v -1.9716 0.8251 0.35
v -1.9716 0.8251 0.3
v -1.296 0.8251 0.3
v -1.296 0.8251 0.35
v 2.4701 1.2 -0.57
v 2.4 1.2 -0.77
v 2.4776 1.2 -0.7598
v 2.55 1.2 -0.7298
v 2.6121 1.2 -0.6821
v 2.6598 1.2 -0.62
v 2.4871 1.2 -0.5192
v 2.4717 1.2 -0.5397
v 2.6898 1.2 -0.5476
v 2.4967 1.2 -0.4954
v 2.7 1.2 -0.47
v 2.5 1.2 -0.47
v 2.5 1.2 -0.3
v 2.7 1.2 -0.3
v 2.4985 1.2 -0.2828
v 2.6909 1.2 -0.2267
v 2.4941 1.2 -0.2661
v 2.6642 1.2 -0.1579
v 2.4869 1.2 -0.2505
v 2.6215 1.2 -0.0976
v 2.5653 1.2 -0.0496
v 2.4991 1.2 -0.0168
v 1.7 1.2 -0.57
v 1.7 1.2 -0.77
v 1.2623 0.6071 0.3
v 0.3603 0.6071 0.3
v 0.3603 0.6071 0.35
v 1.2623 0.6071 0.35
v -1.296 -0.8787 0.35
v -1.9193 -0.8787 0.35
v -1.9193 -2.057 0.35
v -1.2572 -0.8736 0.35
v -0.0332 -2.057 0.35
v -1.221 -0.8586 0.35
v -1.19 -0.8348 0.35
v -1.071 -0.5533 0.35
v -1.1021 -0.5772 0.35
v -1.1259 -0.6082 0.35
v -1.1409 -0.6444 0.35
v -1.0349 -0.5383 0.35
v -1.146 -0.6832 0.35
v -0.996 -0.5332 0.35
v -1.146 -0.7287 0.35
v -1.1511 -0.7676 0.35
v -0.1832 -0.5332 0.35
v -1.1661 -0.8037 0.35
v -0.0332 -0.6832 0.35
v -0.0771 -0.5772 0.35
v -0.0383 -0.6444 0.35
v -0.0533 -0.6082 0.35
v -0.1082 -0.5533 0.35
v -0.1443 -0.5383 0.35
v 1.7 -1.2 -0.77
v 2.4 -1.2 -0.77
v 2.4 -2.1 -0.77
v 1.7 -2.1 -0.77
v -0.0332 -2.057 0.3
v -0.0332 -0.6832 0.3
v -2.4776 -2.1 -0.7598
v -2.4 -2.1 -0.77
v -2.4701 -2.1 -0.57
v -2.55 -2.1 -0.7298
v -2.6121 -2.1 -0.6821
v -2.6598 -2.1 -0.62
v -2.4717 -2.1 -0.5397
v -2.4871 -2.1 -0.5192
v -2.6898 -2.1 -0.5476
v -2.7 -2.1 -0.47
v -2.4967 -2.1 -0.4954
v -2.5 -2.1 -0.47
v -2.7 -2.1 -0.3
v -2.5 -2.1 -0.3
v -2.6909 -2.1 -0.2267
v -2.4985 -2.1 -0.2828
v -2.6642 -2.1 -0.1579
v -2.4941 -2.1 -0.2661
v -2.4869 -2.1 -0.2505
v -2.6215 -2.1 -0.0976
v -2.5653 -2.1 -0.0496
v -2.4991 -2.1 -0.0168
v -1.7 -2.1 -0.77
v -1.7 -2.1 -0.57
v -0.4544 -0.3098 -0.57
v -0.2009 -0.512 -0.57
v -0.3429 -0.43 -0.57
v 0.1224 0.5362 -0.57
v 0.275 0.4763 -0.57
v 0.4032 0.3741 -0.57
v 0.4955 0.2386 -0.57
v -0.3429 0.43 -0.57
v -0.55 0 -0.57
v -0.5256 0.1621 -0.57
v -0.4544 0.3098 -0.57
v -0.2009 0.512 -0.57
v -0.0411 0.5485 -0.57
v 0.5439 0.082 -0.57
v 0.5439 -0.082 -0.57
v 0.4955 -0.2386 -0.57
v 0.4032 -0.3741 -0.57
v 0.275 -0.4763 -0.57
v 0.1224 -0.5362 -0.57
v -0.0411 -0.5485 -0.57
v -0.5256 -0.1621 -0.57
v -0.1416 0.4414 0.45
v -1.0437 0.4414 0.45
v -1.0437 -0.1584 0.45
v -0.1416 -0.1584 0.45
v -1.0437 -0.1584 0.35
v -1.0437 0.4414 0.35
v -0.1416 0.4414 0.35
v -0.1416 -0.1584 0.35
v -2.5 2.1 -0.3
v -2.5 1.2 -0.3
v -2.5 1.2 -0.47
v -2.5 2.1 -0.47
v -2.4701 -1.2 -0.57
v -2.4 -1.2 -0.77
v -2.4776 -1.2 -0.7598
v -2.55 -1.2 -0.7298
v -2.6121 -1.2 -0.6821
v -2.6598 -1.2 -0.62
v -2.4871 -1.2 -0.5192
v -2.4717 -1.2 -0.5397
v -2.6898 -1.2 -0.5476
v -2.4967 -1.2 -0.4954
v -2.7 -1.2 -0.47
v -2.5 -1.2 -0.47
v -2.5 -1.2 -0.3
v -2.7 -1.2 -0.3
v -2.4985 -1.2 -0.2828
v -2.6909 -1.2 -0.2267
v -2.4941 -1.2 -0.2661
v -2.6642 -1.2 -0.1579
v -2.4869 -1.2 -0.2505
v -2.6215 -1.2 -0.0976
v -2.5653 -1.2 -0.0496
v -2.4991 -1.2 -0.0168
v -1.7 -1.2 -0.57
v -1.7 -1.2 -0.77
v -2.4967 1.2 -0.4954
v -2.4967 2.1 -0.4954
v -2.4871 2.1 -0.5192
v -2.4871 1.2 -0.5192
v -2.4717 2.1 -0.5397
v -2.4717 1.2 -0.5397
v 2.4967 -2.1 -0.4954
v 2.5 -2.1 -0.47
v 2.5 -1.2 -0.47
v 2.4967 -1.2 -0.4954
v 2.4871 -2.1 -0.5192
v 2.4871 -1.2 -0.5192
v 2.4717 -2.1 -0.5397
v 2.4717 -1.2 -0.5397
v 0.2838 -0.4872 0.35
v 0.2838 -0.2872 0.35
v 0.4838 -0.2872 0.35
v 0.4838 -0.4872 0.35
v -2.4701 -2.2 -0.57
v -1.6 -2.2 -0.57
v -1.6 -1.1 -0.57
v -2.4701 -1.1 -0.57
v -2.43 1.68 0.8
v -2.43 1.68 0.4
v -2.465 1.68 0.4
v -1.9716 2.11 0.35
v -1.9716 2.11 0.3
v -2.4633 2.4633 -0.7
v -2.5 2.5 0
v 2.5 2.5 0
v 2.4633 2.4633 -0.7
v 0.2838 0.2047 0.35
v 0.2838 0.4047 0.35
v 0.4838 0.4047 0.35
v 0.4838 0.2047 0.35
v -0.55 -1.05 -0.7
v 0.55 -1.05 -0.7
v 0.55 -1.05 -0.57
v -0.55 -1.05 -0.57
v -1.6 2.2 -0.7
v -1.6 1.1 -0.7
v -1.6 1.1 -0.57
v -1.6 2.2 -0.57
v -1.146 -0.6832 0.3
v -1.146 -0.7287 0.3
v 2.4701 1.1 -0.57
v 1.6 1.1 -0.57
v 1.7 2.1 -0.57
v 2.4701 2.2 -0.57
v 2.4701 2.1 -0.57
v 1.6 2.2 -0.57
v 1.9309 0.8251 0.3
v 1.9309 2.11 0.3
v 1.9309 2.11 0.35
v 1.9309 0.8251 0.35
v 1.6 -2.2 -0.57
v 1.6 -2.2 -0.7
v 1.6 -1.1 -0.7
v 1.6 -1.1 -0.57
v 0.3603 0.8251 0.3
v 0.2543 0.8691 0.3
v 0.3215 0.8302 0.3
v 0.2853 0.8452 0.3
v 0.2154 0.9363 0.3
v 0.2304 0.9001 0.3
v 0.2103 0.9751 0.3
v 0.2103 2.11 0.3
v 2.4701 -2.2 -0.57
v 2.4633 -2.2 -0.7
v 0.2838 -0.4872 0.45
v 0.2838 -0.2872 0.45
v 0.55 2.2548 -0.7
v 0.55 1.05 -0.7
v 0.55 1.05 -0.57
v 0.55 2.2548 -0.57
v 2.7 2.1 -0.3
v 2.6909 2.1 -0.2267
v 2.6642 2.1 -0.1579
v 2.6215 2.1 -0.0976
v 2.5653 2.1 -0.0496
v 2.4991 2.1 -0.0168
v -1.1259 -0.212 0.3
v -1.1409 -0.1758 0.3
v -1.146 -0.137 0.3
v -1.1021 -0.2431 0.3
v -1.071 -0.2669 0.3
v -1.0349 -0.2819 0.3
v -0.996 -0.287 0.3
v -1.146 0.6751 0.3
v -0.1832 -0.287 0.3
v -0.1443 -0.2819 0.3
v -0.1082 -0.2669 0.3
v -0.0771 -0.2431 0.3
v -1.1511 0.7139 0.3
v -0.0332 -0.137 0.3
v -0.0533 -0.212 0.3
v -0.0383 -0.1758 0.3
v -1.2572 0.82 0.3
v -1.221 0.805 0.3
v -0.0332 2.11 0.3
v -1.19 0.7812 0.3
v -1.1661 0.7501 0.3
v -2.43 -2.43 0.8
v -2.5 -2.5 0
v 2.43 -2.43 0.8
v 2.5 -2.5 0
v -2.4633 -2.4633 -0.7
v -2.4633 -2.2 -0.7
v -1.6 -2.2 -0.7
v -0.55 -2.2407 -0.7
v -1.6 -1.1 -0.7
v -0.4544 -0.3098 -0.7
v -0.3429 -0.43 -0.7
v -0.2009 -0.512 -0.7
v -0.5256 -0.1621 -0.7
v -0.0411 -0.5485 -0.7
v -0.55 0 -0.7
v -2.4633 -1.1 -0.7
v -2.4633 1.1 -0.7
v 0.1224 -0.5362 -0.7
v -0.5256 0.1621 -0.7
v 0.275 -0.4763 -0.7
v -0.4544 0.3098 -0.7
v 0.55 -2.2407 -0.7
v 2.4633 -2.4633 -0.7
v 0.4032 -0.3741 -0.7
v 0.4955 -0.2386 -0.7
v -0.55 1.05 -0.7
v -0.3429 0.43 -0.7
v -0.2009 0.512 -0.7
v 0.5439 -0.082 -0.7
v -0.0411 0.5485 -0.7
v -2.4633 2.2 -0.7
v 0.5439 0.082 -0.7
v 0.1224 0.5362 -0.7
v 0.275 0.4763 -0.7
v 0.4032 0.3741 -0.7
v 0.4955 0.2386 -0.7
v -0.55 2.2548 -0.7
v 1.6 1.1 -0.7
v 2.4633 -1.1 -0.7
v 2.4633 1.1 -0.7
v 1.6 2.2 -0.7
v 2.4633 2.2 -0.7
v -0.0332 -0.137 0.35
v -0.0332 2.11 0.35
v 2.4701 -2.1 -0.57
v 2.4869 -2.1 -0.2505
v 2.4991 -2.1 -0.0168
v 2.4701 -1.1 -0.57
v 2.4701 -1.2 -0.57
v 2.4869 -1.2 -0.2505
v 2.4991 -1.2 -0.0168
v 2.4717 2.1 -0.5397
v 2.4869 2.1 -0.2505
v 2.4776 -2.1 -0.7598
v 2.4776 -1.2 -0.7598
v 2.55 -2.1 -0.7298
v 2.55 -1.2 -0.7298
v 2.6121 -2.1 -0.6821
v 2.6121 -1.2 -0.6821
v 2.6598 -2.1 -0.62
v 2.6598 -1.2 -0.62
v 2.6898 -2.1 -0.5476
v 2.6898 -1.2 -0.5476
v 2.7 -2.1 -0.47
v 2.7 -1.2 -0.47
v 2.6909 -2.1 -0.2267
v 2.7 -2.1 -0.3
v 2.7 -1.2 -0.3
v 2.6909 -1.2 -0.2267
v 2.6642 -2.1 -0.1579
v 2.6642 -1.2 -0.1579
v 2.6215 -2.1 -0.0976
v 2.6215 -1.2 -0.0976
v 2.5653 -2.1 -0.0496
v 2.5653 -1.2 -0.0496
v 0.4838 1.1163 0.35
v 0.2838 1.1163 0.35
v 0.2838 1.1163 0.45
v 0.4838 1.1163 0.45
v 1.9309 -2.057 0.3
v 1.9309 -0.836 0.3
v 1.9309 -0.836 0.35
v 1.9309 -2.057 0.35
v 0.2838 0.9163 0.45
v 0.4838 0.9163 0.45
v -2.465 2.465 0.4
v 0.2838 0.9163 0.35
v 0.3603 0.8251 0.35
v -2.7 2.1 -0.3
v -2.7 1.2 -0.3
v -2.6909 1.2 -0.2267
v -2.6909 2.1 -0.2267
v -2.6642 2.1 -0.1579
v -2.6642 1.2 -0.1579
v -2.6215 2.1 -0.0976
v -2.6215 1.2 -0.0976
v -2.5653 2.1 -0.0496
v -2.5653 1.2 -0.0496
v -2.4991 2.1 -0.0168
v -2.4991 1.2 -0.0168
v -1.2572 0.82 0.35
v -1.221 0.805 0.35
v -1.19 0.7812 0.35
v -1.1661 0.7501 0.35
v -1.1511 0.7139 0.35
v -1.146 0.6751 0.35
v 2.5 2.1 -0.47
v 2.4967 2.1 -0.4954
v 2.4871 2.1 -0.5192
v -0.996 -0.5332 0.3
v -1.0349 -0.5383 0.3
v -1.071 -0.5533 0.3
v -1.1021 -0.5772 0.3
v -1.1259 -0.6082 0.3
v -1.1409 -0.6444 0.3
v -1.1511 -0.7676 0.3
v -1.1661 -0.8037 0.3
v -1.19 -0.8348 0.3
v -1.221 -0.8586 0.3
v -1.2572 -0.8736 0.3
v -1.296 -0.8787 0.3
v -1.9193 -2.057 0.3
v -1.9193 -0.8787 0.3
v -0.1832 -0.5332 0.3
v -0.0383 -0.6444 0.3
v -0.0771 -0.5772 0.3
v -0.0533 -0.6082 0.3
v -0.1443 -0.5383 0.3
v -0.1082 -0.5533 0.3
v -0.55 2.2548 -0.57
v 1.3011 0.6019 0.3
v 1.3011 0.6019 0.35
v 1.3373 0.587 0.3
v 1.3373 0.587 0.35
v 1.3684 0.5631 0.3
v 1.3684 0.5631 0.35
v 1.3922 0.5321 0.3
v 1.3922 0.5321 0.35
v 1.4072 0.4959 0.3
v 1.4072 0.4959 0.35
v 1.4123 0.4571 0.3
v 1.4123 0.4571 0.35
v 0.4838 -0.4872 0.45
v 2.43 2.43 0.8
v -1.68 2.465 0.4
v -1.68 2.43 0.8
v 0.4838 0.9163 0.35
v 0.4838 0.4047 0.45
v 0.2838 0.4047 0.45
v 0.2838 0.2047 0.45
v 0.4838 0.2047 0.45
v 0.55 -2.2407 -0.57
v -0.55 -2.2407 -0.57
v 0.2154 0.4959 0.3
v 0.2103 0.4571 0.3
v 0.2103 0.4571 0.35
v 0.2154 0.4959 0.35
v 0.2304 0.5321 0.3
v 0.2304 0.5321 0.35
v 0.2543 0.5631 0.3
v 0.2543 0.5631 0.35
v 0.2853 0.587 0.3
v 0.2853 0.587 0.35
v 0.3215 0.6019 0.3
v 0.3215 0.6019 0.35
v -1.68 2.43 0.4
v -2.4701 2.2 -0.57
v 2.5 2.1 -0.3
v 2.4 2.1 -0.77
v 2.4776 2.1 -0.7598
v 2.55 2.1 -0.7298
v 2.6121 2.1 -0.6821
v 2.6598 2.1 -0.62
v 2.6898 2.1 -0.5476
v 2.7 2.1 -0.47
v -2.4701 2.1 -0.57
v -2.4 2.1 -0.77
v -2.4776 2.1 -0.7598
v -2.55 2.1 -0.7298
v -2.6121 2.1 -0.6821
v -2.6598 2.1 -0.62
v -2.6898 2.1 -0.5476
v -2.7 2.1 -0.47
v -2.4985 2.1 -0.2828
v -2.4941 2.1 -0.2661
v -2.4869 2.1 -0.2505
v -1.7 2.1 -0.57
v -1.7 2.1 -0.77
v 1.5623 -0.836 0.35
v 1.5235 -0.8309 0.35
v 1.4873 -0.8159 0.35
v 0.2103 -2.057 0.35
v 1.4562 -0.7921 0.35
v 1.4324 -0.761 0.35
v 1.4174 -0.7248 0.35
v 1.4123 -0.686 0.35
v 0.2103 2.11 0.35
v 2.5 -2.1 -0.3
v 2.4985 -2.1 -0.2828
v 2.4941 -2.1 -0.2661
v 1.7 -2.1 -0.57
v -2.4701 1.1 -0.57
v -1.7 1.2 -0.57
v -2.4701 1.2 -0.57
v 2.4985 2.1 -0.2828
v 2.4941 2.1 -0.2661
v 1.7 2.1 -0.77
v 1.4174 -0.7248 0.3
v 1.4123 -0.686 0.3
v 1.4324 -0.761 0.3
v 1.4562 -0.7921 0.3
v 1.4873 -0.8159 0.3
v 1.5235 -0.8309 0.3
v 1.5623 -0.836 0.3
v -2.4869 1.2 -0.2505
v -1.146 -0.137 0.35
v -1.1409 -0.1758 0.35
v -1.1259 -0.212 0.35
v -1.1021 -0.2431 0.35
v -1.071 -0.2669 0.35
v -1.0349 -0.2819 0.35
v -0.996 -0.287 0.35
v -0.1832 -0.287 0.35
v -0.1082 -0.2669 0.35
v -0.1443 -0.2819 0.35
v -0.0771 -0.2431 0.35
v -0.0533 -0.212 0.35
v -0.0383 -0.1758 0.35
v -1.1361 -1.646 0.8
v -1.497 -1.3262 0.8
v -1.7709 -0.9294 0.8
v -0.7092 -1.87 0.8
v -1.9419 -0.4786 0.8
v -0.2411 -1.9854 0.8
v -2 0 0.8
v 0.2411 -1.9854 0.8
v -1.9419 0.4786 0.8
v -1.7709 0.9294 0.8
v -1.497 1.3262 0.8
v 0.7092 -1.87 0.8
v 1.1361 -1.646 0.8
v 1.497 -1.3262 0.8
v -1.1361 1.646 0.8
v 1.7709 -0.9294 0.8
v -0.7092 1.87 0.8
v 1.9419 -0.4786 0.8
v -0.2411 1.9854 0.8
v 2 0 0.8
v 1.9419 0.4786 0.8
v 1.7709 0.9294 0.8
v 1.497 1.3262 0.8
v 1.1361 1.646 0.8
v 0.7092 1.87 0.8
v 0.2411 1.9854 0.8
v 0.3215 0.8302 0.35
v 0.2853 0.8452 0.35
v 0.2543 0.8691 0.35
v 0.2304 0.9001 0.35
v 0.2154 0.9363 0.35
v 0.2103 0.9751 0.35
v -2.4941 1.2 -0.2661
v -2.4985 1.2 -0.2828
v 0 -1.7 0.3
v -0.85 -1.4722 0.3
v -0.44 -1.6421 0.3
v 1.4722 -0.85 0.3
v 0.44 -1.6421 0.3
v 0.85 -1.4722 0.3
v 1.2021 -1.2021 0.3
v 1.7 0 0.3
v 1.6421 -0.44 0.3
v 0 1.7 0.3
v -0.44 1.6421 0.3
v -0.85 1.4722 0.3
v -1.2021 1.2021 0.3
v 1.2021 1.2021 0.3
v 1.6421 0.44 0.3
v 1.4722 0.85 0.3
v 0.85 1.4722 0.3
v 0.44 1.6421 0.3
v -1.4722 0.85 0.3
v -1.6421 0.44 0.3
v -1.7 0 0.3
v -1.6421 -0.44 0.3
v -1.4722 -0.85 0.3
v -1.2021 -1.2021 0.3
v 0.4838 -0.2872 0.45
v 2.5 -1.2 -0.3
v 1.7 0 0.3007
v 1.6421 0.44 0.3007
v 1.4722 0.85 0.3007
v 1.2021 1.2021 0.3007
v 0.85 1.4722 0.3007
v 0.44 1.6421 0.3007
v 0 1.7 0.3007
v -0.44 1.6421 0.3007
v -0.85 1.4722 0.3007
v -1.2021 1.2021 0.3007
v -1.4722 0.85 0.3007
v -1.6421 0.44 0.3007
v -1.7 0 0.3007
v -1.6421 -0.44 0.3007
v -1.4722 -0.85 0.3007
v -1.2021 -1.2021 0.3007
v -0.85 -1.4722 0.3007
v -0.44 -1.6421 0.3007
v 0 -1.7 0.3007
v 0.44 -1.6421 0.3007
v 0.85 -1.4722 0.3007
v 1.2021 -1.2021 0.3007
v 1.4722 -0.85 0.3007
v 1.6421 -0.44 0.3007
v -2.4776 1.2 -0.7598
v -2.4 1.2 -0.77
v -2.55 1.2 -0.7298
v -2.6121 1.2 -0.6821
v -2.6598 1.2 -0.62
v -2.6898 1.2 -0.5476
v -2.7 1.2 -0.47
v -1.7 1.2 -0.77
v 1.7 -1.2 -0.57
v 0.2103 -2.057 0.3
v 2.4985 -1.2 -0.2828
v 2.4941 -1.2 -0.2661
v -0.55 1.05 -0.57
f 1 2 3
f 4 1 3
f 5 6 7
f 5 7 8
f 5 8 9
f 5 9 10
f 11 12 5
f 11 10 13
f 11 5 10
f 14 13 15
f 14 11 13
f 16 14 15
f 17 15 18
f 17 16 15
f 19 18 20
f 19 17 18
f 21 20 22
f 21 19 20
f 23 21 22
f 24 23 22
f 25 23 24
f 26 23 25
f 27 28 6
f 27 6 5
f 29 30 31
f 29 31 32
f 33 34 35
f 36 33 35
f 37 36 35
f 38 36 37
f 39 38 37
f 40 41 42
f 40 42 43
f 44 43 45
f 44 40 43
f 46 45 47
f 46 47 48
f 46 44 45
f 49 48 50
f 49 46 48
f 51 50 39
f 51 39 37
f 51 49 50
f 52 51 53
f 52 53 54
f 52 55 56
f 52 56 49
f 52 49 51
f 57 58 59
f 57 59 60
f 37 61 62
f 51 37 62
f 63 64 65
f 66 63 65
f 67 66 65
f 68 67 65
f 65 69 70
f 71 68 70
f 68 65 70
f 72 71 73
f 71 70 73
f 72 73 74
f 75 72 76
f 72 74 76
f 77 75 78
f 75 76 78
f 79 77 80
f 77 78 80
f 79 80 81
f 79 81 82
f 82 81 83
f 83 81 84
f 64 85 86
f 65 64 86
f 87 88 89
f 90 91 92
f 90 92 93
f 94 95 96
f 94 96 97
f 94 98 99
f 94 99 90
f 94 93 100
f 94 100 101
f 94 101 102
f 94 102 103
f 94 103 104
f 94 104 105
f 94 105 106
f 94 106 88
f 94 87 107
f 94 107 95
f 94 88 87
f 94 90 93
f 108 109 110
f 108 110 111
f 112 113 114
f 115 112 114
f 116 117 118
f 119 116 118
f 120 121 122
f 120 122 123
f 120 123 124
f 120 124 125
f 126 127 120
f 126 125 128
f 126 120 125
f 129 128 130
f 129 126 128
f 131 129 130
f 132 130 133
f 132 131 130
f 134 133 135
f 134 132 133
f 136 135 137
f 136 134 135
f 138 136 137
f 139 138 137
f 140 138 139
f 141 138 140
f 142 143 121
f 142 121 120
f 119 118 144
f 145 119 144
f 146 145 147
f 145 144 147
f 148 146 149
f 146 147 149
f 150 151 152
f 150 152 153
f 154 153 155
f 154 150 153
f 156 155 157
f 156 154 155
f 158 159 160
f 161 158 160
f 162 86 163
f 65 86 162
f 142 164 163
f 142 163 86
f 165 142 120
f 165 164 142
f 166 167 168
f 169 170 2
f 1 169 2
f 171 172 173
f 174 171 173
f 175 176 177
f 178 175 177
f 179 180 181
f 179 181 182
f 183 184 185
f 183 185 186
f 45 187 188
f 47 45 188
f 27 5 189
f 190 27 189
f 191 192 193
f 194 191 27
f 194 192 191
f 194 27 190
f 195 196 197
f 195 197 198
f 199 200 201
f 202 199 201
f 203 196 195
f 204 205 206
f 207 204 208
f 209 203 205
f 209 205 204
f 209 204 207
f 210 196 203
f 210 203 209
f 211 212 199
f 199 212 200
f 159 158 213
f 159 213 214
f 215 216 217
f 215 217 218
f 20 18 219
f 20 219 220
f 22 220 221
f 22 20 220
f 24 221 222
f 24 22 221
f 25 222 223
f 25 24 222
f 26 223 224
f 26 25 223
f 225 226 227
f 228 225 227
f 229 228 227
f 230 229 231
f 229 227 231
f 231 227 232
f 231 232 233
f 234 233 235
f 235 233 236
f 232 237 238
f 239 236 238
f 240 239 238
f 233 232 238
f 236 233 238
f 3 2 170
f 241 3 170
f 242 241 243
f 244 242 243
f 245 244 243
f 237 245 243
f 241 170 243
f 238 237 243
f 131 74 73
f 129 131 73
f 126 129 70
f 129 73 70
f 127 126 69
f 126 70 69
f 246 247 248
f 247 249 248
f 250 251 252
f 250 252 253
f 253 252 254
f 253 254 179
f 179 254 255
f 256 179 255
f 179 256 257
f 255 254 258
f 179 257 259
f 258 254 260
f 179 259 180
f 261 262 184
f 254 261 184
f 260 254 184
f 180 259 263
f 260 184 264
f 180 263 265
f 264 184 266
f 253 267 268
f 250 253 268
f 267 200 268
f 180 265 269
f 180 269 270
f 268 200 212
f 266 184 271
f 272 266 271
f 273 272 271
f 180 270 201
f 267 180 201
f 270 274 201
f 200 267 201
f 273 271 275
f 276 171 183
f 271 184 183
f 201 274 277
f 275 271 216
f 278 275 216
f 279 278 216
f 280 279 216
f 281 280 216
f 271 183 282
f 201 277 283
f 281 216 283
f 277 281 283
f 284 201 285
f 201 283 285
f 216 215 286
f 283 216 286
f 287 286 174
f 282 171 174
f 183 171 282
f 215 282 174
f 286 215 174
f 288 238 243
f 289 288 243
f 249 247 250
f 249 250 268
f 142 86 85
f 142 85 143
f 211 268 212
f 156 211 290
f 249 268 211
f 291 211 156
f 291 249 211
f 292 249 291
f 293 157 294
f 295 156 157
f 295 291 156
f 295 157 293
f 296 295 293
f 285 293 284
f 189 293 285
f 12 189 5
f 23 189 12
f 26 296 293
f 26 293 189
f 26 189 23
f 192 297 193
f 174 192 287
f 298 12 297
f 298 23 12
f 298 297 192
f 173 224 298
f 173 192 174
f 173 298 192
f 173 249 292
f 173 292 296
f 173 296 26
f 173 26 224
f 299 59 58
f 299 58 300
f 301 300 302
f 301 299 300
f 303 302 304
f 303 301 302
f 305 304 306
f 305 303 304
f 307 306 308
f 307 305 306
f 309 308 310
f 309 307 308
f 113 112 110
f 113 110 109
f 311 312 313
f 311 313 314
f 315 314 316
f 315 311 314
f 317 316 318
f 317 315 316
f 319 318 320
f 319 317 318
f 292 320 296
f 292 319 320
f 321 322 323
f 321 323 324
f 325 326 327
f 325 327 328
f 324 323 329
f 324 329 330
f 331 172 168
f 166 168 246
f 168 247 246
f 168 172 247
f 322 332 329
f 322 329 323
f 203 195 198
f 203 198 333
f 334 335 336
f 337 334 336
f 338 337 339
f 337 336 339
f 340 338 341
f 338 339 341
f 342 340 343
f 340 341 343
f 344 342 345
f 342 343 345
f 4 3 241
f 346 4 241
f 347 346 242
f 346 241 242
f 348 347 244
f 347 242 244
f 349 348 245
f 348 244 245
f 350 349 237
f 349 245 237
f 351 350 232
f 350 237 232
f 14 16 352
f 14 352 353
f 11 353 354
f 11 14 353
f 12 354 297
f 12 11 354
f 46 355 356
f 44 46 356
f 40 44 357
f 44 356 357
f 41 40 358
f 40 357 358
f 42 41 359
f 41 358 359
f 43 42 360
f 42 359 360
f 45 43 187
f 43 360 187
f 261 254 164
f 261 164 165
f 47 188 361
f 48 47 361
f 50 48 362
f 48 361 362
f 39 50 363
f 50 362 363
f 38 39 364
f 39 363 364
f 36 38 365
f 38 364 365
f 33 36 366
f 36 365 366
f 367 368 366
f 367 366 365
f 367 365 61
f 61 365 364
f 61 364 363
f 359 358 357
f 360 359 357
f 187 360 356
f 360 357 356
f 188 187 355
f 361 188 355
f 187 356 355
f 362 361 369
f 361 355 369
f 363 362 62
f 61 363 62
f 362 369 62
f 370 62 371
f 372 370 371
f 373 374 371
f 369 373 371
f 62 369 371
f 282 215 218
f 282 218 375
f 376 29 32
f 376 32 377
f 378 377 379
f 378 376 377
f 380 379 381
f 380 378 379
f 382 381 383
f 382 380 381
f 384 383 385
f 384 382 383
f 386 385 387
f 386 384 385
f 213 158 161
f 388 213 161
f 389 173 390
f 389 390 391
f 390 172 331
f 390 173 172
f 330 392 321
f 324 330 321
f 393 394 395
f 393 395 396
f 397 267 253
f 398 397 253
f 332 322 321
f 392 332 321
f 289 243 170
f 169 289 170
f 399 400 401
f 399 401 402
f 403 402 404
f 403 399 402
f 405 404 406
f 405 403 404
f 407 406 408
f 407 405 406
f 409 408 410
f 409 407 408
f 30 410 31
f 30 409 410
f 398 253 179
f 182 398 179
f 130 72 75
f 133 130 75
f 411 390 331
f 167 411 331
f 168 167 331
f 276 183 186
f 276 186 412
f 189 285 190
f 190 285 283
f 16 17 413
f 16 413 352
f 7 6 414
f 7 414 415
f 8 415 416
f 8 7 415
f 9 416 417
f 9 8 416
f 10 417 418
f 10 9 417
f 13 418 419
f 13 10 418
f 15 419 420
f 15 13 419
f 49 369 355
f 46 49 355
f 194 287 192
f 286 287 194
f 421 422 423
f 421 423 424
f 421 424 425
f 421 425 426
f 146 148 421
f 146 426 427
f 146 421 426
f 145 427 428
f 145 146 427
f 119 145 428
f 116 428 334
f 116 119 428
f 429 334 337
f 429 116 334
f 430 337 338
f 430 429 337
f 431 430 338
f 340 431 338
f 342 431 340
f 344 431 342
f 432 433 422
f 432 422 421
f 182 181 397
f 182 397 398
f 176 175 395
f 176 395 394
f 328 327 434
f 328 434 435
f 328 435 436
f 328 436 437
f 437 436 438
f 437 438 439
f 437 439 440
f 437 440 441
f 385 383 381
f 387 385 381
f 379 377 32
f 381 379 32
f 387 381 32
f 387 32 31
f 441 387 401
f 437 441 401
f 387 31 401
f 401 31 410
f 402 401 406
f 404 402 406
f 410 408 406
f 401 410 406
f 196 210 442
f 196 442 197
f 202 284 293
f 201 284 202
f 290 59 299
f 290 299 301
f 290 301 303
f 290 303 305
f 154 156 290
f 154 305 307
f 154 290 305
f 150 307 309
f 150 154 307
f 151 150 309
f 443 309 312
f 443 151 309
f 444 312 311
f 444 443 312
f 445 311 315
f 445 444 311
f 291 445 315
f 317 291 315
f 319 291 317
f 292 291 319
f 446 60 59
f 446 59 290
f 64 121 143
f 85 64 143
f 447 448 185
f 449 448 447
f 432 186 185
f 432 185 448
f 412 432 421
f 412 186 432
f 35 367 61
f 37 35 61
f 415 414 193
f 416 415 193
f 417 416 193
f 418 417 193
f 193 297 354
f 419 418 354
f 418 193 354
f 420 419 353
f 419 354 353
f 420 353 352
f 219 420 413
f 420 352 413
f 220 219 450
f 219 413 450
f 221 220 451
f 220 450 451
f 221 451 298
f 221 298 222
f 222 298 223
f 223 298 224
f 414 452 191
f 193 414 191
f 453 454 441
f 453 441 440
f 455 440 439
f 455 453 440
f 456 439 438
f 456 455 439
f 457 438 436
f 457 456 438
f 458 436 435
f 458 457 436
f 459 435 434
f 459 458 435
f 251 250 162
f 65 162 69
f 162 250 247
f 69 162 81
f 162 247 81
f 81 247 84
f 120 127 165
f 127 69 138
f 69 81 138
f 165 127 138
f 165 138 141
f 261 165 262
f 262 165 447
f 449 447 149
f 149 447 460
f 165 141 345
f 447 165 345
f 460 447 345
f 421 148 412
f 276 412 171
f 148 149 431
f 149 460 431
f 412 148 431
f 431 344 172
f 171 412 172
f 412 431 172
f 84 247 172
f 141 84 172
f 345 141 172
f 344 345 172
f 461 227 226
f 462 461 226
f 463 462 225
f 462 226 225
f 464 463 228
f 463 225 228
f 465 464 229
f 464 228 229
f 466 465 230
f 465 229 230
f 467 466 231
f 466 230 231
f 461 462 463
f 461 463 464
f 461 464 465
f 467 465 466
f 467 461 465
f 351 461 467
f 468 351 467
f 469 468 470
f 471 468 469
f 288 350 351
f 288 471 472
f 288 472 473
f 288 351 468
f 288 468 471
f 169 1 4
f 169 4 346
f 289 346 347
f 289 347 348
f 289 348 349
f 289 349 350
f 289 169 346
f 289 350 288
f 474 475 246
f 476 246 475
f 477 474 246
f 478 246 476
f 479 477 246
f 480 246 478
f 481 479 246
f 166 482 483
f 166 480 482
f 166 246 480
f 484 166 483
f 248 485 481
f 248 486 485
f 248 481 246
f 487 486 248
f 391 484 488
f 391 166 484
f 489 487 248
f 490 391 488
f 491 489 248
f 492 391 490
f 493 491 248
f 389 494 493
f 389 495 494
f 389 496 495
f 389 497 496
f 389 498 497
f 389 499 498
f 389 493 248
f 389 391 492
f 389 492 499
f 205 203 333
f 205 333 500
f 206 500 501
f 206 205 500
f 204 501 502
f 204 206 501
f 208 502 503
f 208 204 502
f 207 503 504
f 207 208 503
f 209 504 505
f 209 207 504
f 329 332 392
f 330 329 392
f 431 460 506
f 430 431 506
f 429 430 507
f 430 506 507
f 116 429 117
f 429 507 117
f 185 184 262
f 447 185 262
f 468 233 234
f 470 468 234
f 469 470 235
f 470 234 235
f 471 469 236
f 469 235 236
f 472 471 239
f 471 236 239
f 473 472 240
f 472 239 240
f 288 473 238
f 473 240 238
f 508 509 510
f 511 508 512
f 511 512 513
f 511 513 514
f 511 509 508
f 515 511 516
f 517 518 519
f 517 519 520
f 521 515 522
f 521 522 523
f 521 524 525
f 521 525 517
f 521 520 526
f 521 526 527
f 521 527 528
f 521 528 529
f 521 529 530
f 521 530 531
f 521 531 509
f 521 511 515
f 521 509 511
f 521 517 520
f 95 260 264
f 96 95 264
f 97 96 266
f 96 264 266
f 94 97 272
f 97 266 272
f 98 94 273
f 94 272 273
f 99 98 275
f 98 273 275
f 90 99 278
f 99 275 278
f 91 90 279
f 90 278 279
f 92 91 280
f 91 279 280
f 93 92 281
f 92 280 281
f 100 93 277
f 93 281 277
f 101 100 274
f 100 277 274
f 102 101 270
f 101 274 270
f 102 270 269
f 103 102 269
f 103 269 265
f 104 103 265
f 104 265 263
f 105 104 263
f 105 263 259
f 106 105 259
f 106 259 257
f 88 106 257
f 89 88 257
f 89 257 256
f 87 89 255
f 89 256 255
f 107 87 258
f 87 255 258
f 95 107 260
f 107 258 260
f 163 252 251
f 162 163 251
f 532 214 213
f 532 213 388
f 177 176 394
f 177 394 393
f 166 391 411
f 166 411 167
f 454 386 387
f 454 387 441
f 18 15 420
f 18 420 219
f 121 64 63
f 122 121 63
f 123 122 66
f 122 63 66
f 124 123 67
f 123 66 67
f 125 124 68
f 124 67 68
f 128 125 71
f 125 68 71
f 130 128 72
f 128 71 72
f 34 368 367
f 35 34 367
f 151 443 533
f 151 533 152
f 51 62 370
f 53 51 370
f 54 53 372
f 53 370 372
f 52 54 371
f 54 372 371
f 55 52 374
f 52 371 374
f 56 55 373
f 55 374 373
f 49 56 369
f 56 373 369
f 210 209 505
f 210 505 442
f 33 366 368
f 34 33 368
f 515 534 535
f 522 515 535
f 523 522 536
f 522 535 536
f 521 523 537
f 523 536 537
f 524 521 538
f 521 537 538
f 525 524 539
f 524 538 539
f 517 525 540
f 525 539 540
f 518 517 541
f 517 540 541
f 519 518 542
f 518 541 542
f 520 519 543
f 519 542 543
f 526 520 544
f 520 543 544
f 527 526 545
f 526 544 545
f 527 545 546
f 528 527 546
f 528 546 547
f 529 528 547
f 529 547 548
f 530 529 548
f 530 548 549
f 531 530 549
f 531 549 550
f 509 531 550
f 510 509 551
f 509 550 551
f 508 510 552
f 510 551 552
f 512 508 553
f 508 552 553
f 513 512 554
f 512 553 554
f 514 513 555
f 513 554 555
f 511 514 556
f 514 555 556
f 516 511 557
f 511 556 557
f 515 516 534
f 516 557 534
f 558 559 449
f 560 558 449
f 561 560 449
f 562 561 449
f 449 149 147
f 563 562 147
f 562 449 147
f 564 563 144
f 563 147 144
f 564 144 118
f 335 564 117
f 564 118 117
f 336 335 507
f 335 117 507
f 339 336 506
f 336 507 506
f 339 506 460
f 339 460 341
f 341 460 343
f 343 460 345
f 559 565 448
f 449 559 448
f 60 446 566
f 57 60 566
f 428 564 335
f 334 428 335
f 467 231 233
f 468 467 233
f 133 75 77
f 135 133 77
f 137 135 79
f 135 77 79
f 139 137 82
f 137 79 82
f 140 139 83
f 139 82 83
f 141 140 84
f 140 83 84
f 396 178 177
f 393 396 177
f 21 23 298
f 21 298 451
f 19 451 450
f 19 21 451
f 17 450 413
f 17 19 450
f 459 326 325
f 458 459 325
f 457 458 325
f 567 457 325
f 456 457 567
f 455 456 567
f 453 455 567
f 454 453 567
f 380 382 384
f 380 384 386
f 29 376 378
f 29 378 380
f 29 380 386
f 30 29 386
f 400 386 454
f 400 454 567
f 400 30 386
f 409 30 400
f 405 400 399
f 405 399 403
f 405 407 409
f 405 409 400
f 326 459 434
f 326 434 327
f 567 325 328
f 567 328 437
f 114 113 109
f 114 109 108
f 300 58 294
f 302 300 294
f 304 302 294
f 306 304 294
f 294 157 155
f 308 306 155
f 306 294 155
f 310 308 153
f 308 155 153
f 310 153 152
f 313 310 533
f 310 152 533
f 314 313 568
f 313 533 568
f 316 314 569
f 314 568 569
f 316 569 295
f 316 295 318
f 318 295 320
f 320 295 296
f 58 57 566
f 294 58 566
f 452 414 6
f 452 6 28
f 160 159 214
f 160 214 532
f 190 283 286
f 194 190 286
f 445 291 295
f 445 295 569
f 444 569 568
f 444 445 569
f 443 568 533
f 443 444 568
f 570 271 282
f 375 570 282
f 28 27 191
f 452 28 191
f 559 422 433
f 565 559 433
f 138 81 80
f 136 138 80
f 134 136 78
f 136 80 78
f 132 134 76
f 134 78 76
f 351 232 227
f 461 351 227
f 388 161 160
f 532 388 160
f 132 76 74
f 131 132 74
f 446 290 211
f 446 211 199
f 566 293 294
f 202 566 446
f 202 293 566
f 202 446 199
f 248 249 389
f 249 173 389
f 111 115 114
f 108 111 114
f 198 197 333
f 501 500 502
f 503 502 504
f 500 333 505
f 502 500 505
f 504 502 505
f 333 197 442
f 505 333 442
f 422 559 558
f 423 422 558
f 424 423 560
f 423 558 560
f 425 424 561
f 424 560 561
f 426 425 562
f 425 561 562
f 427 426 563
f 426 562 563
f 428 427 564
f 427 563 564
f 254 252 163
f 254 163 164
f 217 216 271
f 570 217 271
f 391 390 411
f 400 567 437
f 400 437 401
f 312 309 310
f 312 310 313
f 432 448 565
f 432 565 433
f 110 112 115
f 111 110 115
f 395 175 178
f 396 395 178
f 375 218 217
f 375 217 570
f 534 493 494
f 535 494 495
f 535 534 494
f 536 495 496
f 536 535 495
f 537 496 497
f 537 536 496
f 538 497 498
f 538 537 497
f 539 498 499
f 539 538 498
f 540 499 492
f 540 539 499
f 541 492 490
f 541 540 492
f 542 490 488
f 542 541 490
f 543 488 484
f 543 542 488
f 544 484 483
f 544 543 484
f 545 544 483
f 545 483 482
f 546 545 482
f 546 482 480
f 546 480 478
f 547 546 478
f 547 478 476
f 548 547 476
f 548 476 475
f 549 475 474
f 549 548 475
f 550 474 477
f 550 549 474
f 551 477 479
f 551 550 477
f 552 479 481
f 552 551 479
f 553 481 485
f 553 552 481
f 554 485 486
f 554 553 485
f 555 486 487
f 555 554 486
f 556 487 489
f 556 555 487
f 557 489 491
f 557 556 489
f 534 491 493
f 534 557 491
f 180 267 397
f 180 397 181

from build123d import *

# Parameters (mm, degrees)
SKETCH_1_W                       = 5
SKETCH_1_H                       = 5
EXTRUDE_1_DEPTH                  = 0.7
EXTRUDE_1_DRAFT                  = -3
SKETCH_3_R                       = 0.55
SKETCH_3_W                       = 1.424481166
SKETCH_3_H                       = 1.1
SKETCH_3_W_2                     = 1.1
SKETCH_3_H_2                     = 1.20483499
SKETCH_3_H_3                     = 1.190667693
SKETCH_3_W_3                     = 1.035065358
SKETCH_3_W_4                     = 1.548034511
CUT_EXTRUDE_1_DEPTH              = 0.13
SKETCH_5_W                       = 0.8
SKETCH_5_H                       = 0.9
SM_BASE_FLANGE_1_DEPTH           = 0.2
SM_EDGE_FLANGE_1_STRIP_W         = 1
SM_EDGE_FLANGE_1_STRIP_H         = 0.2
SM_EDGE_FLANGE_1_STRIP_CUT_DEPTH = 0.9
SM_EDGE_FLANGE_1_DEPTH           = 0.9
SM_EDGE_FLANGE_2_STRIP_W         = 1
SM_EDGE_FLANGE_2_STRIP_H         = 0.2
SM_EDGE_FLANGE_2_STRIP_CUT_DEPTH = 0.9
SM_EDGE_FLANGE_2_DEPTH           = 0.9
PATTERN_LINEAR_1_COUNT           = 2
PATTERN_LINEAR_1_PITCH           = 3.3
SKETCH_30_W                      = 5
SKETCH_30_H                      = 5
EXTRUDE_3_DEPTH                  = 0.8
EXTRUDE_3_TAPER                  = 5
CUT_EXTRUDE_2_DEPTH              = 0.4
SKETCH_34_R                      = 1.7
CUT_EXTRUDE_3_DEPTH              = 0.5
CHAMFER_1_SIZE                   = 0.3
CHAMFER_1_SIZE2                  = 0.499283845
EXTRUDE_4_DEPTH                  = 0.05
EXTRUDE_4_2_DEPTH                = 0.05
EXTRUDE_4_3_DEPTH                = 0.05
EXTRUDE_4_4_DEPTH                = 0.05
SKETCH_49_W                      = 0.902111922
SKETCH_49_H                      = 0.599755728
EXTRUDE_5_DEPTH                  = 0.1
SKETCH_49_W_2                    = 0.2
SKETCH_49_H_2                    = 0.2
EXTRUDE_5_2_DEPTH                = 0.1
EXTRUDE_5_3_DEPTH                = 0.1
EXTRUDE_5_4_DEPTH                = 0.1


# Sheet-metal steps are written as plain solids
with BuildPart() as part:
    # Sketch 1 → Бобышка-Вытянуть1 (with draft: the straight prism first)
    with BuildSketch(Plane.XY):
        Rectangle(SKETCH_1_W, SKETCH_1_H)
    extrude(amount=-EXTRUDE_1_DEPTH)
    # Бобышка-Вытянуть1: the draft: its side faces are tilted about the plane it starts from
    extrude_1_sides = [part.faces().sort_by_distance(p)[0] for p in [
        (-2.5, 0, -0.35),
        (0, -2.5, -0.35),
        (2.5, 0, -0.35),
        (0, 2.5, -0.35),
    ]]
    draft(extrude_1_sides, Plane.XY, EXTRUDE_1_DRAFT)

    # Sketch 3 → Вырез-Вытянуть1 (cut)
    with BuildSketch(Plane(origin=(0, 0, -0.7), x_dir=(-1, 0, 0), z_dir=(0, 0, -1))):
        Circle(SKETCH_3_R)
        with Locations((-2.312240583, 1.65)):
            Rectangle(SKETCH_3_W, SKETCH_3_H)
        with Locations((0, 1.652417495)):
            Rectangle(SKETCH_3_W_2, SKETCH_3_H_2)
        with Locations((0, -1.645333847)):
            Rectangle(SKETCH_3_W_2, SKETCH_3_H_3)
        with Locations((2.117532679, 1.65)):
            Rectangle(SKETCH_3_W_3, SKETCH_3_H)
        with Locations((-2.374017256, -1.65)):
            Rectangle(SKETCH_3_W_4, SKETCH_3_H)
        with Locations((2.117532679, -1.65)):
            Rectangle(SKETCH_3_W_3, SKETCH_3_H)
    extrude(amount=-CUT_EXTRUDE_1_DEPTH, mode=Mode.SUBTRACT)



with BuildPart() as body_2:
    # Sketch 5 → Базовая кромка1 (new body)
    with BuildSketch(Plane(origin=(0, 0, -0.57), x_dir=(-1, 0, 0), z_dir=(0, 0, -1))):
        with Locations((-2.1, 1.65)):
            Rectangle(SKETCH_5_W, SKETCH_5_H)
    extrude(amount=SM_BASE_FLANGE_1_DEPTH)

    # Ребро-кромка1 strip (across the edge) → Ребро-кромка1 strip cut (cut)
    with BuildSketch(Plane(origin=(2.5, 1.2, -0.57), x_dir=(-1, 0, 0), z_dir=(0, 1, 0))):
        with Locations((-0.4, -0.1)):
            Rectangle(SM_EDGE_FLANGE_1_STRIP_W, SM_EDGE_FLANGE_1_STRIP_H)
    extrude(amount=SM_EDGE_FLANGE_1_STRIP_CUT_DEPTH, mode=Mode.SUBTRACT)

    # Ребро-кромка1 section (across the edge) → Ребро-кромка1 (add)
    with BuildSketch(Plane(origin=(2.5, 1.2, -0.57), x_dir=(-1, 0, 0), z_dir=(0, 1, 0))):
        with BuildLine():
            Line((-0.2, 0.1), (-0.2, 0.57))
            Line((-0.2, 0.57), (0, 0.57))
            Line((0, 0.57), (0, 0.1))
            ThreePointArc((0, 0.1), (0.029289322, 0.029289322), (0.1, 0))
            Line((0.1, 0), (0.1, -0.2))
            ThreePointArc((0.1, -0.2), (-0.112132034, -0.112132034), (-0.2, 0.1))
        make_face()
    extrude(amount=SM_EDGE_FLANGE_1_DEPTH)

    # Ребро-кромка2 strip (across the edge) → Ребро-кромка2 strip cut (cut)
    with BuildSketch(Plane(origin=(2.5, 1.2, 0), x_dir=(0, 0, -1), z_dir=(0, 1, 0))):
        with Locations((-0.2, -0.1)):
            Rectangle(SM_EDGE_FLANGE_2_STRIP_W, SM_EDGE_FLANGE_2_STRIP_H)
    extrude(amount=SM_EDGE_FLANGE_2_STRIP_CUT_DEPTH, mode=Mode.SUBTRACT)

    # Ребро-кромка2 section (across the edge) → Ребро-кромка2 (add)
    with BuildSketch(Plane(origin=(2.5, 1.2, 0), x_dir=(0, 0, -1), z_dir=(0, 1, 0))):
        with BuildLine():
            Line((0, 0.1), (0, 0.4))
            Line((0, 0.4), (0.2, 0.4))
            Line((0.2, 0.4), (0.2, 0.1))
            ThreePointArc((0.2, 0.1), (0.229289322, 0.029289322), (0.3, 0))
            Line((0.3, 0), (0.3, -0.2))
            ThreePointArc((0.3, -0.2), (0.087867966, -0.112132034), (0, 0.1))
        make_face()
    extrude(amount=SM_EDGE_FLANGE_2_DEPTH)


with BuildPart() as pattern_linear_1_1:
    # Линейный массив1: pattern copy
    add(body_2.part.moved(Location(Vector(0, -1, 0) * (1 * PATTERN_LINEAR_1_PITCH))))


with BuildPart() as body_4:
    # Зеркальное отражение1: mirrored copy
    add(body_2.part.mirror(Plane(origin=(0, 0, 0), x_dir=(0, 0, 1), z_dir=(1, 0, 0))))


with BuildPart() as body_5:
    # Mirror 1 2: mirrored copy
    add(pattern_linear_1_1.part.mirror(Plane(origin=(0, 0, 0), x_dir=(0, 0, 1), z_dir=(1, 0, 0))))


with BuildPart() as part_1:
    add(part.part)

    add(body_2.part)  # Бобышка-Вытянуть3 merges body 2

    add(pattern_linear_1_1.part)  # Бобышка-Вытянуть3 merges Линейный массив1_1

    add(body_4.part)  # Бобышка-Вытянуть3 merges body 4

    add(body_5.part)  # Бобышка-Вытянуть3 merges body 5
    # Эскиз30 → Бобышка-Вытянуть3 (add)
    with BuildSketch(Plane.XY):
        Rectangle(SKETCH_30_W, SKETCH_30_H)
    extrude(amount=EXTRUDE_3_DEPTH, taper=EXTRUDE_3_TAPER)

    # Эскиз33 → Вырез-Вытянуть2 (cut)
    with BuildSketch(Plane.XY.offset(0.8)):
        Polygon((-1.680009069, 2.430009069), (-2.430009069, 1.680009069), (-2.879687624, 1.680009069), (-2.879687624, 2.879687624), (-1.680009069, 2.879687624), align=None)
    extrude(amount=-CUT_EXTRUDE_2_DEPTH, mode=Mode.SUBTRACT)

    # Эскиз34 → Вырез-Вытянуть3 (cut)
    with BuildSketch(Plane.XY.offset(0.8)):
        Circle(SKETCH_34_R)
    extrude(amount=-CUT_EXTRUDE_3_DEPTH, mode=Mode.SUBTRACT)

    # Фаска1
    chamfer_1_edges = [part_1.edges().sort_by_distance(p)[0] for p in [
        (-1.7, 0, 0.8),
    ]]
    chamfer_1_side = [part_1.faces().sort_by_distance(p)[0] for p in [
        (0, -2.361278034, 0.8),
    ]]
    chamfer(chamfer_1_edges, length=CHAMFER_1_SIZE, length2=CHAMFER_1_SIZE2, reference=chamfer_1_side[0])


with BuildPart() as body_2_2:
    # Эскиз48 → Бобышка-Вытянуть4 (new body)
    with BuildSketch(Plane.XY.offset(0.3)):
        with BuildLine():
            Line((0.210318716, -2.05695293), (0.210318716, 0.457058905))
            ThreePointArc((0.210318716, 0.457058905), (0.254252699, 0.563124922), (0.360318716, 0.607058905))
            Line((0.360318716, 0.607058905), (1.262305442, 0.607058905))
            ThreePointArc((1.262305442, 0.607058905), (1.36837146, 0.563124922), (1.412305442, 0.457058905))
            Line((1.412305442, 0.457058905), (1.412305442, -0.686015987))
            ThreePointArc((1.412305442, -0.686015987), (1.456239425, -0.792082004), (1.562305442, -0.836015987))
            Line((1.562305442, -0.836015987), (1.930905545, -0.836015987))
            Line((1.930905545, -0.836015987), (1.930905545, -2.05695293))
            Line((1.930905545, -2.05695293), (0.210318716, -2.05695293))
        make_face()
    extrude(amount=EXTRUDE_4_DEPTH)


with BuildPart() as body_3:
    # Эскиз48 → Extrude 4 2 (new body)
    with BuildSketch(Plane.XY.offset(0.3)):
        with BuildLine():
            Line((0.210318716, 2.110000815), (1.930905545, 2.110000815))
            Line((1.930905545, 2.110000815), (1.930905545, 0.825125098))
            Line((1.930905545, 0.825125098), (0.360318716, 0.825125098))
            ThreePointArc((0.360318716, 0.825125098), (0.254252699, 0.869059081), (0.210318716, 0.975125098))
            Line((0.210318716, 0.975125098), (0.210318716, 2.110000815))
        make_face()
    extrude(amount=EXTRUDE_4_2_DEPTH)


with BuildPart() as body_4_2:
    # Эскиз48 → Extrude 4 3 (new body)
    with BuildSketch(Plane.XY.offset(0.3)):
        with BuildLine():
            Line((-0.033165046, -2.05695293), (-0.033165046, -0.683219524))
            ThreePointArc((-0.033165046, -0.683219524), (-0.077099029, -0.577153506), (-0.183165046, -0.533219524))
            Line((-0.183165046, -0.533219524), (-0.996028626, -0.533219524))
            ThreePointArc((-0.996028626, -0.533219524), (-1.102094643, -0.577153506), (-1.146028626, -0.683219524))
            Line((-1.146028626, -0.683219524), (-1.146028626, -0.728739244))
            ThreePointArc((-1.146028626, -0.728739244), (-1.189962609, -0.834805261), (-1.296028626, -0.878739244))
            Line((-1.296028626, -0.878739244), (-1.919276728, -0.878739244))
            Line((-1.919276728, -0.878739244), (-1.919276728, -2.05695293))
            Line((-1.919276728, -2.05695293), (-0.033165046, -2.05695293))
        make_face()
    extrude(amount=EXTRUDE_4_3_DEPTH)


with BuildPart() as body_5_2:
    # Эскиз48 → Extrude 4 4 (new body)
    with BuildSketch(Plane.XY.offset(0.3)):
        with BuildLine():
            Line((-0.033165046, 2.110000815), (-1.971607025, 2.110000815))
            Line((-1.971607025, 2.110000815), (-1.971607025, 0.825125098))
            Line((-1.971607025, 0.825125098), (-1.296028626, 0.825125098))
            ThreePointArc((-1.296028626, 0.825125098), (-1.189962609, 0.781191115), (-1.146028626, 0.675125098))
            Line((-1.146028626, 0.675125098), (-1.146028626, -0.137005614))
            ThreePointArc((-1.146028626, -0.137005614), (-1.102094643, -0.243071632), (-0.996028626, -0.287005614))
            Line((-0.996028626, -0.287005614), (-0.183165046, -0.287005614))
            ThreePointArc((-0.183165046, -0.287005614), (-0.077099029, -0.243071632), (-0.033165046, -0.137005614))
            Line((-0.033165046, -0.137005614), (-0.033165046, 2.110000815))
        make_face()
    extrude(amount=EXTRUDE_4_4_DEPTH)


with BuildPart() as body_6:
    # Эскиз49 → Бобышка-Вытянуть5 (new body)
    with BuildSketch(Plane.XY.offset(0.35)):
        with Locations((-0.592641639, 0.141472266)):
            Rectangle(SKETCH_49_W, SKETCH_49_H)
    extrude(amount=EXTRUDE_5_DEPTH)


with BuildPart() as body_7:
    # Эскиз49 → Extrude 5 2 (new body)
    with BuildSketch(Plane.XY.offset(0.35)):
        with Locations((0.383820167, 1.016322564)):
            Rectangle(SKETCH_49_W_2, SKETCH_49_H_2)
    extrude(amount=EXTRUDE_5_2_DEPTH)


with BuildPart() as body_8:
    # Эскиз49 → Extrude 5 3 (new body)
    with BuildSketch(Plane.XY.offset(0.35)):
        with Locations((0.383820167, 0.304674762)):
            Rectangle(SKETCH_49_W_2, SKETCH_49_H_2)
    extrude(amount=EXTRUDE_5_3_DEPTH)


with BuildPart() as body_9:
    # Эскиз49 → Extrude 5 4 (new body)
    with BuildSketch(Plane.XY.offset(0.35)):
        with Locations((0.383820167, -0.387189749)):
            Rectangle(SKETCH_49_W_2, SKETCH_49_H_2)
    extrude(amount=EXTRUDE_5_4_DEPTH)


solid = Compound([part_1.part, body_2_2.part, body_3.part, body_4_2.part, body_5_2.part, body_6.part, body_7.part, body_8.part, body_9.part])
